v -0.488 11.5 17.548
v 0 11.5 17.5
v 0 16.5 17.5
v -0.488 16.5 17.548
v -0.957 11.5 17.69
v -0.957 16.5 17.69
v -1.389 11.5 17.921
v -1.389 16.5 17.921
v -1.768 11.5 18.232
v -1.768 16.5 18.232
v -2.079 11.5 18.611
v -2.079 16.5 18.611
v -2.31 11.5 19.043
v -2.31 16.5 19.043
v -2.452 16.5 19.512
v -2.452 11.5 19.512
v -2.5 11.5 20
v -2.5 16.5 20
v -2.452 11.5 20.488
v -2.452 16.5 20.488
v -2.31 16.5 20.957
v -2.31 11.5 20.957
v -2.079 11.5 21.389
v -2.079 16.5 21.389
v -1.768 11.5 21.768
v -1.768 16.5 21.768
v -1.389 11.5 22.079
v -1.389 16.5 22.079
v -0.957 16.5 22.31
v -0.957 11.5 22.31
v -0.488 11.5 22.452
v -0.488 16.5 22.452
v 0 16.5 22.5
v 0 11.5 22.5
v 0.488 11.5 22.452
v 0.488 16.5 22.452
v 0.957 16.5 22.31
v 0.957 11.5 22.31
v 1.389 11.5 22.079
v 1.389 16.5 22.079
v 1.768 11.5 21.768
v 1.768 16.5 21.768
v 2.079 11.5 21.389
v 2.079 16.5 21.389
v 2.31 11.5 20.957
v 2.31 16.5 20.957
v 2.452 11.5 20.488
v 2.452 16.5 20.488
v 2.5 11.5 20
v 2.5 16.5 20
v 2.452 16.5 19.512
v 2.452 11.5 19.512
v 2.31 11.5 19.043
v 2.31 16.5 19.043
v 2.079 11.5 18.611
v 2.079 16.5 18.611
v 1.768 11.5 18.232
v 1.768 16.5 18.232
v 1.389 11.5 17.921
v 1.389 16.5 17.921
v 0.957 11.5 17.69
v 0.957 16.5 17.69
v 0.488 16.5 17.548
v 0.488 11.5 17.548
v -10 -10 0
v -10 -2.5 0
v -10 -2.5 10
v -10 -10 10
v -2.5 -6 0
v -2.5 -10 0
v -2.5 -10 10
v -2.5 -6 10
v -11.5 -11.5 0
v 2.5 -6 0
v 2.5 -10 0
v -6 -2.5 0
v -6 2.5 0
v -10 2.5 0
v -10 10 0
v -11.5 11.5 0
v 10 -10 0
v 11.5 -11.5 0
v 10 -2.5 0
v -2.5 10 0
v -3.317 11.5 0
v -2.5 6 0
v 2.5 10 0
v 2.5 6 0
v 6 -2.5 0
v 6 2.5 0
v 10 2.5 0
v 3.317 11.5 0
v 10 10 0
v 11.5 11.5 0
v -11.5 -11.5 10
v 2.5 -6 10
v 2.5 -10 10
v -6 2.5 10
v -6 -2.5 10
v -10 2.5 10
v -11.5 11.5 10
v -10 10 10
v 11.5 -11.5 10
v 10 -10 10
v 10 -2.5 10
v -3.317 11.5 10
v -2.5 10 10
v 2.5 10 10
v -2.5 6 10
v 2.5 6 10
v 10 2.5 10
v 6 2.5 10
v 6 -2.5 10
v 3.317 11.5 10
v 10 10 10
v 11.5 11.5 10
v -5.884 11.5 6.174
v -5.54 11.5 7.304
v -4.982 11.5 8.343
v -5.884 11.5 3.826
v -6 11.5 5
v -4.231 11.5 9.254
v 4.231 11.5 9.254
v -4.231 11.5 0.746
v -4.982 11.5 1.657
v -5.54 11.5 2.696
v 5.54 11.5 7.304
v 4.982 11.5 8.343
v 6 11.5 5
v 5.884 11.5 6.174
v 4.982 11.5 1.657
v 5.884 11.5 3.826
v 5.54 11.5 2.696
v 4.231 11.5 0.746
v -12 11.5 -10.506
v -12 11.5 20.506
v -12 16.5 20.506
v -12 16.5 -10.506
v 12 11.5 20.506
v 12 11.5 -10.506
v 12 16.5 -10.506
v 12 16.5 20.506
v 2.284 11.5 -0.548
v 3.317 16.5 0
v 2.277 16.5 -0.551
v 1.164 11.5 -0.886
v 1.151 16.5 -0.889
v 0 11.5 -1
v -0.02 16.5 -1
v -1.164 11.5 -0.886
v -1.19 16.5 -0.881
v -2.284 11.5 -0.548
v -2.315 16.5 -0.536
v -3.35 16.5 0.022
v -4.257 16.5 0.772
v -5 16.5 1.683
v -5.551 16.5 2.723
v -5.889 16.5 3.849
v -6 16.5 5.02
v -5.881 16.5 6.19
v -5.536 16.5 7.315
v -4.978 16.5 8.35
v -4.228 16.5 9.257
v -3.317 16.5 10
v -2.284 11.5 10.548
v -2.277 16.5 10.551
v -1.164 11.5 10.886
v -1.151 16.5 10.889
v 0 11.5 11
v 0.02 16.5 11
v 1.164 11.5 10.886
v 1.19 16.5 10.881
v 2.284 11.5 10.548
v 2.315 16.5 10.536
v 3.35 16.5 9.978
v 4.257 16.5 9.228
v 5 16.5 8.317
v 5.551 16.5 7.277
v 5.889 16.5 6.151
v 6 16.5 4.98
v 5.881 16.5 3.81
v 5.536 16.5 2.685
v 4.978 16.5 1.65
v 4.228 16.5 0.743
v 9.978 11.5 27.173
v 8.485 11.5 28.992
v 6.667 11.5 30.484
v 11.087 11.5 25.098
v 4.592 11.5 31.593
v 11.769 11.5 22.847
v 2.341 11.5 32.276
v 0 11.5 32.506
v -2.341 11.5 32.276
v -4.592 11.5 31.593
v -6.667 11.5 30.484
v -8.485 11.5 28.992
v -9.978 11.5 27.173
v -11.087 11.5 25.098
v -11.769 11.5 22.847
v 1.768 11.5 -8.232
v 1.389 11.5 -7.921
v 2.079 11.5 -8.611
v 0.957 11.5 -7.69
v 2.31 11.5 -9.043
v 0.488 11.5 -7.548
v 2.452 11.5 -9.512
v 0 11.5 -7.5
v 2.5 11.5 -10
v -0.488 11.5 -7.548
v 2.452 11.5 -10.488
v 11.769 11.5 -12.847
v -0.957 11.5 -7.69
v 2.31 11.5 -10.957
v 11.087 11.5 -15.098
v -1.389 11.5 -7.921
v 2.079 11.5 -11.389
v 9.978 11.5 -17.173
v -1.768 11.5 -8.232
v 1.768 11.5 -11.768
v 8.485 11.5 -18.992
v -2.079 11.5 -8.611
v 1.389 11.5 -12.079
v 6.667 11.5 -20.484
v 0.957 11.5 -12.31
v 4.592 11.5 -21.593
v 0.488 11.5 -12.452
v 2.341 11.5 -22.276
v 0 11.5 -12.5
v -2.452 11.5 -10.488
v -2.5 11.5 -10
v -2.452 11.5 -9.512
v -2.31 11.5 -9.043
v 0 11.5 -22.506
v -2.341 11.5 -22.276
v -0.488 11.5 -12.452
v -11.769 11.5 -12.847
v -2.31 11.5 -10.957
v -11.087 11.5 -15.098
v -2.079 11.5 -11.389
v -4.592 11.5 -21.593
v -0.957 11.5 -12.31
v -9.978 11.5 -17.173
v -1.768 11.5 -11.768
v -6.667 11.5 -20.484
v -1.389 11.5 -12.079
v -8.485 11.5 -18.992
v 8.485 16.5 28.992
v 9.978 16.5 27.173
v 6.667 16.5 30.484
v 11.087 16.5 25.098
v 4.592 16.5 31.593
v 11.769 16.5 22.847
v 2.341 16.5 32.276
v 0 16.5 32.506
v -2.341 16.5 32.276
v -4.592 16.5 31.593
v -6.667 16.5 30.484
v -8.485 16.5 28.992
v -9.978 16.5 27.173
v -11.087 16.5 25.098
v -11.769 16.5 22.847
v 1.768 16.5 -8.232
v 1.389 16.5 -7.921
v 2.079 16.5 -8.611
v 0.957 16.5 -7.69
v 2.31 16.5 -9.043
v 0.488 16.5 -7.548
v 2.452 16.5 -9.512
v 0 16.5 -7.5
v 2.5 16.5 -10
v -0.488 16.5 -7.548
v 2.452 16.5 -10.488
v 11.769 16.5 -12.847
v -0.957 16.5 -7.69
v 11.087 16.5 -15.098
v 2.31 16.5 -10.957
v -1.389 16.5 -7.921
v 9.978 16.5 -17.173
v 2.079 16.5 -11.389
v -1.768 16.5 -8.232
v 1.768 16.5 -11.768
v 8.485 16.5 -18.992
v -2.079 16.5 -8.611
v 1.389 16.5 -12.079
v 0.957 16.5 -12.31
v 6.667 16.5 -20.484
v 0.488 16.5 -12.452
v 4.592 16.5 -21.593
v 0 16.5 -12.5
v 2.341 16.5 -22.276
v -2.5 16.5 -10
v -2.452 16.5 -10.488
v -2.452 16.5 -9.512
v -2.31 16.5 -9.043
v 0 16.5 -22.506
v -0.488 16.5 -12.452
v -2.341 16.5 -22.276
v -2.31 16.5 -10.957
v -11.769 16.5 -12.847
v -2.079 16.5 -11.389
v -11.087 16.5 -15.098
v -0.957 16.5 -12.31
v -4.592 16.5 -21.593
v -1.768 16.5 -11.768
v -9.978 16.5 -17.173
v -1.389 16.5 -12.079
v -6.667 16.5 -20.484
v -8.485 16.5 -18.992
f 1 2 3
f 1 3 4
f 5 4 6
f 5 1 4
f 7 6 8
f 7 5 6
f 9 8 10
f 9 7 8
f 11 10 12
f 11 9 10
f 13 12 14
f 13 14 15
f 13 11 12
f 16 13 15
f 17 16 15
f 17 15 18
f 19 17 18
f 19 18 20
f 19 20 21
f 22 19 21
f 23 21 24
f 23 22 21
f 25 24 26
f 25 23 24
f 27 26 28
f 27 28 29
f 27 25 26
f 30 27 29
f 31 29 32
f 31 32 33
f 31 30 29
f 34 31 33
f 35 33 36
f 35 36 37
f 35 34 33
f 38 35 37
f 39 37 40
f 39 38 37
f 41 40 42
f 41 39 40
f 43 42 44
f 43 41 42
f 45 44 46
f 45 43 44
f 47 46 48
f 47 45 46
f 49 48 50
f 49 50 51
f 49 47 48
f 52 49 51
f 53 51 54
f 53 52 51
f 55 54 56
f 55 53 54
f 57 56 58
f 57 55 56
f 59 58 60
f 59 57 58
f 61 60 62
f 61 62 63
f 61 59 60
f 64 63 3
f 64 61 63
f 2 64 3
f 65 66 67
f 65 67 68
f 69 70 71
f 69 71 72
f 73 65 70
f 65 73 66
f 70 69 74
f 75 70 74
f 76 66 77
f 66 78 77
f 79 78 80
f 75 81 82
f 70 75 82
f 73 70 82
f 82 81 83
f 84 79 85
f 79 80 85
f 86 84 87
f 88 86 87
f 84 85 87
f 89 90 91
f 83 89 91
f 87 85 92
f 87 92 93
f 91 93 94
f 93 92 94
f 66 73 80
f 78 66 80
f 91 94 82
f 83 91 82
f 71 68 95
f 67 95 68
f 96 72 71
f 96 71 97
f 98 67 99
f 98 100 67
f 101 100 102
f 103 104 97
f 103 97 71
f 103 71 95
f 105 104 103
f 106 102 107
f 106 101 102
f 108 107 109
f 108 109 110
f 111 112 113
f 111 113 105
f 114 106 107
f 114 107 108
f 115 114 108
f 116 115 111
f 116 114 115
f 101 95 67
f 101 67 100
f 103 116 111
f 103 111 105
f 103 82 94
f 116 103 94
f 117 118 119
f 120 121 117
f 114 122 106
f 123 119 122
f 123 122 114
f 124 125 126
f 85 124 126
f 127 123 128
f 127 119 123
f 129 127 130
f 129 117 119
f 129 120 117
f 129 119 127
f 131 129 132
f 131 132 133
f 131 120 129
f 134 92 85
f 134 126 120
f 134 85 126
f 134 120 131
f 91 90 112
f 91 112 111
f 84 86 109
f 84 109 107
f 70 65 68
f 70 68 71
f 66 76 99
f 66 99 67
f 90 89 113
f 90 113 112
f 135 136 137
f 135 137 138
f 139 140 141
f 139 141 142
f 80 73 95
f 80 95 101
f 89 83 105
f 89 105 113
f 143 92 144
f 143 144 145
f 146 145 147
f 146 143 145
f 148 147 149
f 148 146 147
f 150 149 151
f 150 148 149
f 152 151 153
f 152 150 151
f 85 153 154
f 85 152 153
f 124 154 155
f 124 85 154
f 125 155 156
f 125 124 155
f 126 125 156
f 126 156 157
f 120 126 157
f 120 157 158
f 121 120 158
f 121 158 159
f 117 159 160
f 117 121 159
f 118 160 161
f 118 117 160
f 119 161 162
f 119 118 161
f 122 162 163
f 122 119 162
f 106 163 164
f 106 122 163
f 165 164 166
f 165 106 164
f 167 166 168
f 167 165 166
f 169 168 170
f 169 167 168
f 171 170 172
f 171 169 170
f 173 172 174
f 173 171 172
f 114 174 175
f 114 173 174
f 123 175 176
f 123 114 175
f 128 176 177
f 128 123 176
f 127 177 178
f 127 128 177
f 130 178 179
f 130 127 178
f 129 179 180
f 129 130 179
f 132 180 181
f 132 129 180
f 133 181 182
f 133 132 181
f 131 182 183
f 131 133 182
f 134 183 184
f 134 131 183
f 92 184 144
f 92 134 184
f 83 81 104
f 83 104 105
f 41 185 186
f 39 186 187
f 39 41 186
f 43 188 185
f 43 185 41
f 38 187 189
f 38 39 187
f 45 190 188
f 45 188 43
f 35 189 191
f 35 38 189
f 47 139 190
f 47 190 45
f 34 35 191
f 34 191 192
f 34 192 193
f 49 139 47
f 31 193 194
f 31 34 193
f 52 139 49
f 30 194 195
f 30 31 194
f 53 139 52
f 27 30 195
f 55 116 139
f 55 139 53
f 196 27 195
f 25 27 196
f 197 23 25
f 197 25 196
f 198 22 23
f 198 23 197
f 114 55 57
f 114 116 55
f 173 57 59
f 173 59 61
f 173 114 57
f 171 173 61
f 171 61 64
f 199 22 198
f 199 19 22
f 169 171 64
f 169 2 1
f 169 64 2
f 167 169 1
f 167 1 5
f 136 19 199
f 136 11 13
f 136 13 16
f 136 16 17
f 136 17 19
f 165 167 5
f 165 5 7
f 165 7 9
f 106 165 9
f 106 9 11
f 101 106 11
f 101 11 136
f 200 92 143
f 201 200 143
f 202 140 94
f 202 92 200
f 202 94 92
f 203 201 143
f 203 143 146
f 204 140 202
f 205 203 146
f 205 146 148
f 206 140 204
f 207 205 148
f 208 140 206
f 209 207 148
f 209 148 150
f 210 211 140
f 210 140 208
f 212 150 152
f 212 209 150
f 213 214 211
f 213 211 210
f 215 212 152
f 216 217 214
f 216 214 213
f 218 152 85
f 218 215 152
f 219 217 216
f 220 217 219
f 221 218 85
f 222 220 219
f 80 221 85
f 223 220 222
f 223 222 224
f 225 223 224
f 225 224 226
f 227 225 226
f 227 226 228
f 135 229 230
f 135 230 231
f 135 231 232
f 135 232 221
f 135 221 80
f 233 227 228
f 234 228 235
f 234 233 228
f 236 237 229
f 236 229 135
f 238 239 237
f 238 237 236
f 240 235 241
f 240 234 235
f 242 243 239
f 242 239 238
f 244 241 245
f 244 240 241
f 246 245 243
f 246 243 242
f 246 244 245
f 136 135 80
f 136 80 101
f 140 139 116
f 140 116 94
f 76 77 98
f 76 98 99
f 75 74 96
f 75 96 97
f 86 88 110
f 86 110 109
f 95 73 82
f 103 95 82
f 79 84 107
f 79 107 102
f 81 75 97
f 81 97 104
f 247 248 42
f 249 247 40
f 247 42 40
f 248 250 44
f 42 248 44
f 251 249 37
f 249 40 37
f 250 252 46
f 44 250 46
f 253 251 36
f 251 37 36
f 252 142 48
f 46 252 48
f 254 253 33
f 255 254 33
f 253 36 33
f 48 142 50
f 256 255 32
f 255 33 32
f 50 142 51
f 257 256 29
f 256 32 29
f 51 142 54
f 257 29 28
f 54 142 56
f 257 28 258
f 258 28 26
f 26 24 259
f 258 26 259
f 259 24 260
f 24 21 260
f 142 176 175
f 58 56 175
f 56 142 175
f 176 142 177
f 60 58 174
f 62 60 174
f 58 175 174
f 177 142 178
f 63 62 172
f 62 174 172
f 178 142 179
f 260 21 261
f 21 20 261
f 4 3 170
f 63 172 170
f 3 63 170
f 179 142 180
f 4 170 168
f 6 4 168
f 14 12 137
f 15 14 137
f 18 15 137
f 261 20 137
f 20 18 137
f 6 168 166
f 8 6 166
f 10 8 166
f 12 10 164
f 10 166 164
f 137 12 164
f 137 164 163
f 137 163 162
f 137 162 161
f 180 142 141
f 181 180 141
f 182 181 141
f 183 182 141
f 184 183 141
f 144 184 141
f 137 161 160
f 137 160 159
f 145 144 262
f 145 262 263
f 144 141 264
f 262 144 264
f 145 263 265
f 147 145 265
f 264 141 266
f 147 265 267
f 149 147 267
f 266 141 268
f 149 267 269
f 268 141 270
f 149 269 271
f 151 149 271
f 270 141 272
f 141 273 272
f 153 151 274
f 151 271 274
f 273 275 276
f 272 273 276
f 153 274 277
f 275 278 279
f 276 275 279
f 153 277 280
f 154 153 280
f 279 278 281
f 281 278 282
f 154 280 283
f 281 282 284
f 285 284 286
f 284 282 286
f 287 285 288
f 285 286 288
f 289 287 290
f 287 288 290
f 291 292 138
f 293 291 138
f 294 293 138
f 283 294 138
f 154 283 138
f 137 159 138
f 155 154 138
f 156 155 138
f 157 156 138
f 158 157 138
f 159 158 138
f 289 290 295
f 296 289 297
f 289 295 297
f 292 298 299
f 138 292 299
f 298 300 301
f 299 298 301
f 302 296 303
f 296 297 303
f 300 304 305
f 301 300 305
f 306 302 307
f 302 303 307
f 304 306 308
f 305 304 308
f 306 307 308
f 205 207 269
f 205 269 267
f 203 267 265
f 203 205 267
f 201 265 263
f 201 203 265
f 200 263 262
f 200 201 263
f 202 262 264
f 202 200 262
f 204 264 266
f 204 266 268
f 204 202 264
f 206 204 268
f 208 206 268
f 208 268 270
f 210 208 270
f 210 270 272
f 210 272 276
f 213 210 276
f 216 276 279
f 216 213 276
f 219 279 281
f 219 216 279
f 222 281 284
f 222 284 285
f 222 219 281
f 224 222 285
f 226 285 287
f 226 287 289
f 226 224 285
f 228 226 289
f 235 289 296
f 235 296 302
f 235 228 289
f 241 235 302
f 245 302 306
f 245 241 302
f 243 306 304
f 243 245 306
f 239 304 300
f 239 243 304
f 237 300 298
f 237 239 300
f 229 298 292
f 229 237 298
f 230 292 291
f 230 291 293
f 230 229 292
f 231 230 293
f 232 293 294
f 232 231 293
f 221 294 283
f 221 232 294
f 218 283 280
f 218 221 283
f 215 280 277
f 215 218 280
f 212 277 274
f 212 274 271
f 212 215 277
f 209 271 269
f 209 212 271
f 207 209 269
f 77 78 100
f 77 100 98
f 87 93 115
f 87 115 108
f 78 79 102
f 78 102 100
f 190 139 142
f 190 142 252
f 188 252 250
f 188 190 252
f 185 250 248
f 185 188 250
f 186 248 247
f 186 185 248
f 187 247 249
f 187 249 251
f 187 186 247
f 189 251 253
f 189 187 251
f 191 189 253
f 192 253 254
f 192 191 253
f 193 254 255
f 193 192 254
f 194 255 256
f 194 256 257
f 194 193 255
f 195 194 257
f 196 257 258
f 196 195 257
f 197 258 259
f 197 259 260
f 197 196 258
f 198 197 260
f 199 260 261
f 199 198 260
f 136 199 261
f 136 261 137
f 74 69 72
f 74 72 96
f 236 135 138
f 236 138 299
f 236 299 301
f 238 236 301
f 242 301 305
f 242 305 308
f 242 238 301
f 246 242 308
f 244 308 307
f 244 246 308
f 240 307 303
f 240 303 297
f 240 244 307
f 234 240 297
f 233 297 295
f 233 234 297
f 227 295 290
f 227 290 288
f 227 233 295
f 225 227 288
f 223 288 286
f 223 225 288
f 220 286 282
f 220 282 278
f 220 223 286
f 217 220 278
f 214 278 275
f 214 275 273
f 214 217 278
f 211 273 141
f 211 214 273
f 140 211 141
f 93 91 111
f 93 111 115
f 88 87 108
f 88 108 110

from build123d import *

# Parameters (mm, degrees)
SKETCH1_W           = 23
SKETCH1_H           = 23
BOSS_EXTRUDE1_DEPTH = 10
SKETCH2_R           = 2.5
SKETCH2_R_2         = 6
BOSS_EXTRUDE2_DEPTH = 5


with BuildPart() as part:
    # Sketch1 → Boss-Extrude1 (new body)
    with BuildSketch(Plane.XY):
        Rectangle(SKETCH1_W, SKETCH1_H)
        Polygon((-2.5, 10), (-10, 10), (-10, 2.5), (-6, 2.5), (-6, -2.5), (-10, -2.5), (-10, -10), (-2.5, -10), (-2.5, -6), (2.5, -6), (2.5, -10), (10, -10), (10, -2.5), (6, -2.5), (6, 2.5), (10, 2.5), (10, 10), (2.5, 10), (2.5, 6), (-2.5, 6), align=None, mode=Mode.SUBTRACT)
    extrude(amount=BOSS_EXTRUDE1_DEPTH)

    # Sketch2 → Boss-Extrude2 (add)
    with BuildSketch(Plane(origin=(0, 11.5, 0), x_dir=(1, 0, 0), z_dir=(0, 1, 0))):
        with BuildLine():
            Line((-12, -20.506265624), (-12, 10.506265624))
            ThreePointArc((-12, 10.506265624), (0, 22.506265624), (12, 10.506265624))
            Line((12, 10.506265624), (12, -20.506265624))
            ThreePointArc((12, -20.506265624), (0, -32.506265624), (-12, -20.506265624))
        make_face()
        with Locations(Location((0, 10, 0), (0, 0, 270))):
            Circle(SKETCH2_R, mode=Mode.SUBTRACT)
        with Locations(Location((0, -20, 0), (0, 0, 90))):
            Circle(SKETCH2_R, mode=Mode.SUBTRACT)
        with Locations(Location((0, -5, 0), (0, 0, 56.442690238))):
            Circle(SKETCH2_R_2, mode=Mode.SUBTRACT)
    extrude(amount=BOSS_EXTRUDE2_DEPTH)


solid = part.part
